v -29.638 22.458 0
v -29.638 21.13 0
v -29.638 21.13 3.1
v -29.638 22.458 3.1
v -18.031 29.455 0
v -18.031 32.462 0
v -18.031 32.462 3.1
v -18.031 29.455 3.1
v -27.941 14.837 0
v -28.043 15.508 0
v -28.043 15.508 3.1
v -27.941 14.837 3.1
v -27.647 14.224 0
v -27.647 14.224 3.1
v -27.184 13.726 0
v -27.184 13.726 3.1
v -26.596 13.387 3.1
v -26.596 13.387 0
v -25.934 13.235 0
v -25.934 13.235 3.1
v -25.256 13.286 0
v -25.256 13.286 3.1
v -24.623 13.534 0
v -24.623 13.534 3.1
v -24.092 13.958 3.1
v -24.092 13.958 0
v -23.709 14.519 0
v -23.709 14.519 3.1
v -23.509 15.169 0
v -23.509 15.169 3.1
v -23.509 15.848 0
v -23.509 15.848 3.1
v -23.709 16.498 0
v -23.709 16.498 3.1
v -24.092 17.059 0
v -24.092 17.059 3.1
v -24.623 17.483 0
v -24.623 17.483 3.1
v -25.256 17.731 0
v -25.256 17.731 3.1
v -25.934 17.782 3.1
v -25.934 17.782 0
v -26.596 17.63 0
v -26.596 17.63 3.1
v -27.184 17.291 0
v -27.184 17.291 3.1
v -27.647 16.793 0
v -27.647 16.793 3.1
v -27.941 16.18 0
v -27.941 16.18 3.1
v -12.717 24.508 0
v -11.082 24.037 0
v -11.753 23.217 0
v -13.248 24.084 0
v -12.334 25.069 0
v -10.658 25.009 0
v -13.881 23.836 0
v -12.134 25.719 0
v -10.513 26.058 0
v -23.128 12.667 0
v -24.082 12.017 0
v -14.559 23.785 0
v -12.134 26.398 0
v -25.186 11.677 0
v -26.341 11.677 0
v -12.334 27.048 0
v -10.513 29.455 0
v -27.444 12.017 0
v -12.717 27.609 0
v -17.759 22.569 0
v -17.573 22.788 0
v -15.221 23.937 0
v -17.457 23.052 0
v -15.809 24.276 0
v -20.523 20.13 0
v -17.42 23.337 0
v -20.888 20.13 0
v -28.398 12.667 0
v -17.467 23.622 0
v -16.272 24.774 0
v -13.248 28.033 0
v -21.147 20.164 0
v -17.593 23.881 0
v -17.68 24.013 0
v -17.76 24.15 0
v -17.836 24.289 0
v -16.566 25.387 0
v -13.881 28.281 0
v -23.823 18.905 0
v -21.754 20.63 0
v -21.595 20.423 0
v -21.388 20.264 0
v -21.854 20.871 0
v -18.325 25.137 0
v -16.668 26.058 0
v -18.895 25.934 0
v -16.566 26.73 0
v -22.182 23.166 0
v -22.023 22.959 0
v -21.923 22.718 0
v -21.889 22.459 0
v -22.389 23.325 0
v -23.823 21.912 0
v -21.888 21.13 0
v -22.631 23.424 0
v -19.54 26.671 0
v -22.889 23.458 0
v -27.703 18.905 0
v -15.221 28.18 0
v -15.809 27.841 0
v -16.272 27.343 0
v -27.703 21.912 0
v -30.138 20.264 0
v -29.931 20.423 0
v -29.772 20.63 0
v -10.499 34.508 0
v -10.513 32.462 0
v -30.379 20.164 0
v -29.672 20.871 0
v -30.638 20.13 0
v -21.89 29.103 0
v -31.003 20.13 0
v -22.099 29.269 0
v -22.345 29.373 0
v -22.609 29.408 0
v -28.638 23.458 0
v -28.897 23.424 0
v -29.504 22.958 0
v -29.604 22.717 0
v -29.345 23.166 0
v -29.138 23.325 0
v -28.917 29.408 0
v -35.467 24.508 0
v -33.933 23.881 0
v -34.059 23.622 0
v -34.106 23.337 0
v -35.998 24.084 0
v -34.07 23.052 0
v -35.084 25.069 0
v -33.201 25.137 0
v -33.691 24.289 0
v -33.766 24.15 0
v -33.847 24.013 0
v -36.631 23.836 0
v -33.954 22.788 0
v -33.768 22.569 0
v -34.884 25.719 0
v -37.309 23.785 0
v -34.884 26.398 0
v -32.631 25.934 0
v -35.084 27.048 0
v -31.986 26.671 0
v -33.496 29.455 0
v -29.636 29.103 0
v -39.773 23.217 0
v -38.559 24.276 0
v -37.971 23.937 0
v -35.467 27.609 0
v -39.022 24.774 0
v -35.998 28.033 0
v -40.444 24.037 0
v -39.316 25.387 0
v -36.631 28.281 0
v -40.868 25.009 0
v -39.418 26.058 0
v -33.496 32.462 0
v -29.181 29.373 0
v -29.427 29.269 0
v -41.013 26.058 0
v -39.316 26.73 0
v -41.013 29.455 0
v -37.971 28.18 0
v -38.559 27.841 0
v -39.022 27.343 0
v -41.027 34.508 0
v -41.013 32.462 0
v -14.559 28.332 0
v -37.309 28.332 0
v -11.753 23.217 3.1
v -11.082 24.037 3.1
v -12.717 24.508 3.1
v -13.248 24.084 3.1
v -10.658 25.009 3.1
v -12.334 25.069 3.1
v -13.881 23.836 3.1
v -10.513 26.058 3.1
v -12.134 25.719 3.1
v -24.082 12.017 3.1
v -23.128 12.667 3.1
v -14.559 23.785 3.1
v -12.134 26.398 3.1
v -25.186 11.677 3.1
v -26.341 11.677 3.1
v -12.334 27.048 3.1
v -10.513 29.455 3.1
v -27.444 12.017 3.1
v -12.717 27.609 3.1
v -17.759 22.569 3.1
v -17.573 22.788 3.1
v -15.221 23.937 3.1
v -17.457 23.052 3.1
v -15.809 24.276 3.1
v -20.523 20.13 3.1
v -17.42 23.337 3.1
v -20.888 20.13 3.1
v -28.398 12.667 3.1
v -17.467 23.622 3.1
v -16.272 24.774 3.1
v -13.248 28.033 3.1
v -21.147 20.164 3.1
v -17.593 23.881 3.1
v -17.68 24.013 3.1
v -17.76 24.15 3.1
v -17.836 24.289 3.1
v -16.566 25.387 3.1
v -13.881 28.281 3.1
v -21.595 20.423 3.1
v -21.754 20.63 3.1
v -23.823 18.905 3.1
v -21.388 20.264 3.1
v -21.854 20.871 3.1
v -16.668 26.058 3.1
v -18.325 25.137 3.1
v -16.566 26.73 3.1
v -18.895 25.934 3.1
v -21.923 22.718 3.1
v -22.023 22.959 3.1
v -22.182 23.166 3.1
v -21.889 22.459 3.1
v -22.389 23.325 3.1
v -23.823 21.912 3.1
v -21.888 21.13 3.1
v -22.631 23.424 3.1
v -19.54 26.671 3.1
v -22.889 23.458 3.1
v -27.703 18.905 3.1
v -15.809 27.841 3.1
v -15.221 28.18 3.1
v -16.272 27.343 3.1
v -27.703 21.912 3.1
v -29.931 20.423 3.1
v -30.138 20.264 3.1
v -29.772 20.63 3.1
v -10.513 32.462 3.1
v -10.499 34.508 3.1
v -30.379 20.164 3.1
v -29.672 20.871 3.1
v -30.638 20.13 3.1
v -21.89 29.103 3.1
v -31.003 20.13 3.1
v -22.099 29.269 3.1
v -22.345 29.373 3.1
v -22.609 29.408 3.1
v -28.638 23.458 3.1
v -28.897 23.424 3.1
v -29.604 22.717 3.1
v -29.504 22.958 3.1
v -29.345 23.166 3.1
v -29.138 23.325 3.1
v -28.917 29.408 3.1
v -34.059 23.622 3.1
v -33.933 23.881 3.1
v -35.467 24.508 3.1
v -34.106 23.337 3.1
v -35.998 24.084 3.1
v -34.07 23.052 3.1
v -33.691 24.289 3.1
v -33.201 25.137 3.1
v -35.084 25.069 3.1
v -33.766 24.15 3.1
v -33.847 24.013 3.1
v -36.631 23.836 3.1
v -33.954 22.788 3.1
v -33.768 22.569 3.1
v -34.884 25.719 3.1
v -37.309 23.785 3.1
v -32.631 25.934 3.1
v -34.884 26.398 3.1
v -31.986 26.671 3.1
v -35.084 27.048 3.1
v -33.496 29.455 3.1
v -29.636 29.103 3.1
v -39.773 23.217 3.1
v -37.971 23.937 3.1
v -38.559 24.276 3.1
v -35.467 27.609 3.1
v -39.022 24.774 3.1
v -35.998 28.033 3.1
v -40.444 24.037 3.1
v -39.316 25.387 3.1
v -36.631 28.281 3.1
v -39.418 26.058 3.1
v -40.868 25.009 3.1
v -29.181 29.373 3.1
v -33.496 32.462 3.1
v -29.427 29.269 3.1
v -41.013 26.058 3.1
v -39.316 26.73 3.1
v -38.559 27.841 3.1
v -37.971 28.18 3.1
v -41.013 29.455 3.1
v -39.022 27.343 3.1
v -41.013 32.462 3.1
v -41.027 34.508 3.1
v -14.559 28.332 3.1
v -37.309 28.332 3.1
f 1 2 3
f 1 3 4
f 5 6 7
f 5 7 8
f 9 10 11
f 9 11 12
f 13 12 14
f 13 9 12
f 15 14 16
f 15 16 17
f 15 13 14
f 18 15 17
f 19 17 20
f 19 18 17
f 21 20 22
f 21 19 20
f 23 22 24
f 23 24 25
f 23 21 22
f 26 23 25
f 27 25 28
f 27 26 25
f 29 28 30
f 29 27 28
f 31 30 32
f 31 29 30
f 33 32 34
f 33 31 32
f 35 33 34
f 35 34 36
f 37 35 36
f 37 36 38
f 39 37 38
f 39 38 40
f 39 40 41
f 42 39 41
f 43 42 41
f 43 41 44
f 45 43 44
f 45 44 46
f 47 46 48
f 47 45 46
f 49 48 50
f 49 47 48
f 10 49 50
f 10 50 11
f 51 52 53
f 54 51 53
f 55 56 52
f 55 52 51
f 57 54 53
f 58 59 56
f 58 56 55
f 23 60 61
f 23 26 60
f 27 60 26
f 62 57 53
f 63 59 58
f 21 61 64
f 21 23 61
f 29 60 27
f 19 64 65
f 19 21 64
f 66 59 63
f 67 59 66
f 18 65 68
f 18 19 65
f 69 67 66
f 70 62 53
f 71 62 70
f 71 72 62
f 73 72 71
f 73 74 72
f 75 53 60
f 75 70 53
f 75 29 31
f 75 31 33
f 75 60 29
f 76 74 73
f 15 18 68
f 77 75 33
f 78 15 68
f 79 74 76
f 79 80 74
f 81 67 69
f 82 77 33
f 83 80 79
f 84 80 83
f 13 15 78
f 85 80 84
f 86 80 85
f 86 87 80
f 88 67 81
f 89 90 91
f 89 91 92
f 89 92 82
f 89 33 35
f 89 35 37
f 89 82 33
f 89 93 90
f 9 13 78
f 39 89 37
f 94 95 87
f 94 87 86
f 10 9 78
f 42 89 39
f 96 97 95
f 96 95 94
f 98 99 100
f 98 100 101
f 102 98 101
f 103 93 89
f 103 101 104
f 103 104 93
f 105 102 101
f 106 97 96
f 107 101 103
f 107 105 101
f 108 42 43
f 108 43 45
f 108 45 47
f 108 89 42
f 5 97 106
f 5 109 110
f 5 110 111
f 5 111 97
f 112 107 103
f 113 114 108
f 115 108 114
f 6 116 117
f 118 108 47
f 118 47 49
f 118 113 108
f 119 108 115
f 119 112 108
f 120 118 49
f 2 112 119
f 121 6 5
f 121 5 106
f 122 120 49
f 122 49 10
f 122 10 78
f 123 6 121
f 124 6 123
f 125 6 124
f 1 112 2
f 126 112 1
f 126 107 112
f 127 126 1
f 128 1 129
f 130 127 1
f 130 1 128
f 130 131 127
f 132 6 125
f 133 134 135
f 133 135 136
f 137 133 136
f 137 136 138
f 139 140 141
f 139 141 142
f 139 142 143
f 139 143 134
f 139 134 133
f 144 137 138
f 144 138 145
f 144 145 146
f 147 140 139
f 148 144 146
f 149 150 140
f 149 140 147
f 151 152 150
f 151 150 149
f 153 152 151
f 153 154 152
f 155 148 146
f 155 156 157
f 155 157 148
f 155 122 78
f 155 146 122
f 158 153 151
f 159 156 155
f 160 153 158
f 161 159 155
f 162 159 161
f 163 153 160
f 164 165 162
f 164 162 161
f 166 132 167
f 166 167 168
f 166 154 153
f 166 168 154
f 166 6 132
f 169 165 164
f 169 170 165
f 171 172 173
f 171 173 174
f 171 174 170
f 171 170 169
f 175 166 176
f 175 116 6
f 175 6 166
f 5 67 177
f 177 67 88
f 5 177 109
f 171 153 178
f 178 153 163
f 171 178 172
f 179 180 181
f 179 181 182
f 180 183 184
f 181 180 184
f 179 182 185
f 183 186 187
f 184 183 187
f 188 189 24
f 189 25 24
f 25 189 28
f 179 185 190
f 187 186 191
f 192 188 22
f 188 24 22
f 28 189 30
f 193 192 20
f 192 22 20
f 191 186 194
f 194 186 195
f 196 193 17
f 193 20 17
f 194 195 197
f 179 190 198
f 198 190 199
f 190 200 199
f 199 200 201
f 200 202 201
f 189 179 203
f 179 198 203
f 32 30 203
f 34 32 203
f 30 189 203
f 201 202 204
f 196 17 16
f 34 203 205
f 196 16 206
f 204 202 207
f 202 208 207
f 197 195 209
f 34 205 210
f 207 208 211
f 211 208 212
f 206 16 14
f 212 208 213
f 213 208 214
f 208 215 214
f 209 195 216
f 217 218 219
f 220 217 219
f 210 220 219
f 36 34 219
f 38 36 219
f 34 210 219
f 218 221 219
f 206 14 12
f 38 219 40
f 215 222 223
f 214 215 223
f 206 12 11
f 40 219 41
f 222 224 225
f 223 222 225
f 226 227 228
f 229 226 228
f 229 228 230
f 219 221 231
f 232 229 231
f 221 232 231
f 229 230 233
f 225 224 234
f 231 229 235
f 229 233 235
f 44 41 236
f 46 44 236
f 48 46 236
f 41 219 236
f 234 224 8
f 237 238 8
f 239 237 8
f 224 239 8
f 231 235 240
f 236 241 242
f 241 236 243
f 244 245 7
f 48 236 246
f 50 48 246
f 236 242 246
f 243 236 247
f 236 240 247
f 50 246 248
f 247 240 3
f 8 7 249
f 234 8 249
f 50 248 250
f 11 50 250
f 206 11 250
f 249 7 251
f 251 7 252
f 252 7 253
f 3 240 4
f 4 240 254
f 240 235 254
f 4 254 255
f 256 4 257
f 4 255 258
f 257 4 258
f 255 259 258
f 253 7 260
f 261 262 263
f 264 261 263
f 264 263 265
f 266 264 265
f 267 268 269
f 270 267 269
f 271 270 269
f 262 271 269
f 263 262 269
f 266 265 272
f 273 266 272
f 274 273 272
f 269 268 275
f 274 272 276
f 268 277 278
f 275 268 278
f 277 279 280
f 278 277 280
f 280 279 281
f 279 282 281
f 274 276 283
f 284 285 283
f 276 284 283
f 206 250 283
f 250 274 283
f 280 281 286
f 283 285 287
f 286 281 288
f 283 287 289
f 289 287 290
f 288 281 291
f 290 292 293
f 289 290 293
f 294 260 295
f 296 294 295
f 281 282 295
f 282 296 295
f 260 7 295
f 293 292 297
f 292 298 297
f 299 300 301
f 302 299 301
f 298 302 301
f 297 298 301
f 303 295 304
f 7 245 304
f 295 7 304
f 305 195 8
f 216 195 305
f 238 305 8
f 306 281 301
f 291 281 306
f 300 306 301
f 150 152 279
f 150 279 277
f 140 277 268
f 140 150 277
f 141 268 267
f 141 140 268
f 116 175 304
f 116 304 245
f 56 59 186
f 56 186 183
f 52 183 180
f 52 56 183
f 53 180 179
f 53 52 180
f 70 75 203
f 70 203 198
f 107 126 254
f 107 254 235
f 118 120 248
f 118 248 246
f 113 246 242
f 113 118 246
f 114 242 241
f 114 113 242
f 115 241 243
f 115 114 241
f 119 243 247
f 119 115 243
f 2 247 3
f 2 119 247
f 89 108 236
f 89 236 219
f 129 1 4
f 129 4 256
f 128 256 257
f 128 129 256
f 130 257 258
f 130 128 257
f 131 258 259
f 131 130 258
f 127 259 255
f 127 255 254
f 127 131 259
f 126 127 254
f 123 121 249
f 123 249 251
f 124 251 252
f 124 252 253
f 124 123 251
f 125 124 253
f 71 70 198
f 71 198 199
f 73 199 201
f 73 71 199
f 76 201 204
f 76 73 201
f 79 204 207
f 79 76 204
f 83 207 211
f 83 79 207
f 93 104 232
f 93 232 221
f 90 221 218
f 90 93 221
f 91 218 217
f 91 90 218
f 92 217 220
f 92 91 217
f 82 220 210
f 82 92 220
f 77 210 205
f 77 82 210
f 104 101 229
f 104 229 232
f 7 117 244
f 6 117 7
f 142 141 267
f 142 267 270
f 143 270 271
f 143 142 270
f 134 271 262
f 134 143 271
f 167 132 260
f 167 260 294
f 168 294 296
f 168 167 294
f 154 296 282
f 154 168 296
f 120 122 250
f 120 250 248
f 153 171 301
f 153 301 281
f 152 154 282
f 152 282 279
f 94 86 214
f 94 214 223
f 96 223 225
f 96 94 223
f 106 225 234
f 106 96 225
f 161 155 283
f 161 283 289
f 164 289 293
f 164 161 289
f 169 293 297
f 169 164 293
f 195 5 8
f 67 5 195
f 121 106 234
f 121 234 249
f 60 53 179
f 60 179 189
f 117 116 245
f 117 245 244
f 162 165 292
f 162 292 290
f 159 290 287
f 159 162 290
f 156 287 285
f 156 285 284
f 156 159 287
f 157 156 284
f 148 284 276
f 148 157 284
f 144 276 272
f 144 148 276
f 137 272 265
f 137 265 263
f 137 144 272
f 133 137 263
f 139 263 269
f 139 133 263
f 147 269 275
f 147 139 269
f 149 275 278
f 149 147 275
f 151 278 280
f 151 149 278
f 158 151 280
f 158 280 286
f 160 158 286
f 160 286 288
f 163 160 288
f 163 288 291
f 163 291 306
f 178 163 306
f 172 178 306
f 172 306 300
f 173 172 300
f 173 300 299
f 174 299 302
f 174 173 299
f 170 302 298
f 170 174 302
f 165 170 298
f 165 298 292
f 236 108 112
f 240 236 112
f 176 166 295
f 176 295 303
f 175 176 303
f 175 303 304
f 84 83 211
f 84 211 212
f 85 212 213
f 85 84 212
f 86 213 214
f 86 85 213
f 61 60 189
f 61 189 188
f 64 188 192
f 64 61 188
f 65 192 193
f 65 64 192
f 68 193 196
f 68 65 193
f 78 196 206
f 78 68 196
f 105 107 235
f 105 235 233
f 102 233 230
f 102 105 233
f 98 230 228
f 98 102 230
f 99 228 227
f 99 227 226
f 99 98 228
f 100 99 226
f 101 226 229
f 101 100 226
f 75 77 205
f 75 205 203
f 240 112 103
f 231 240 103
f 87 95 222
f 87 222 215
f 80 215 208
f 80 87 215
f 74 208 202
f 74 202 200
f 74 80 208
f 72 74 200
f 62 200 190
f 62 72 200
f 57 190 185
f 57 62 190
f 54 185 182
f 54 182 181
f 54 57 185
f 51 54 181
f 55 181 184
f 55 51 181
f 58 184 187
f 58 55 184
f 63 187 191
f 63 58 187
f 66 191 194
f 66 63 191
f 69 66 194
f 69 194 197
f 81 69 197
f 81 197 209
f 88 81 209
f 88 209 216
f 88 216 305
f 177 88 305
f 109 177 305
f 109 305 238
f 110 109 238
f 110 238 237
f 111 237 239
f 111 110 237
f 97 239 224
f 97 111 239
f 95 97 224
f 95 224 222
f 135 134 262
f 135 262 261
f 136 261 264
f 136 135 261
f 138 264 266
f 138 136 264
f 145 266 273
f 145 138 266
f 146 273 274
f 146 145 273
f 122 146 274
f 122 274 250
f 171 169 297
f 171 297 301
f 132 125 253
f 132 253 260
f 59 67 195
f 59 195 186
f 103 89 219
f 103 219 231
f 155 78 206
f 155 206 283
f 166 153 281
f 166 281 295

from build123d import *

# Parameters (mm, degrees)
SKETCH1_R      = 2.2795
SKETCH1_W      = 3.88
SKETCH1_H      = 3.007
EXTRUDE1_DEPTH = 3.1


with BuildPart() as part:
    # Sketch1 → Extrude1 (new body)
    with BuildSketch(Plane.XY):
        with BuildLine():
            Line((-41.027382287, 34.508489293), (-10.498924525, 34.508489293))
            Line((-10.498924525, 34.508489293), (-10.513157114, 32.461989293))
            Line((-10.513157114, 32.461989293), (-18.030657114, 32.461989293))
            Line((-18.030657114, 32.461989293), (-18.030657114, 29.454989293))
            Line((-18.030657114, 29.454989293), (-10.513157114, 29.454989293))
            Line((-10.513157114, 29.454989293), (-10.513157114, 26.058489293))
            ThreePointArc((-10.513157114, 26.058489293), (-10.83664158, 24.508533678), (-11.7530861, 23.217358224))
            Line((-11.7530861, 23.217358224), (-23.1280861, 12.667358224))
            ThreePointArc((-23.1280861, 12.667358224), (-25.763157114, 11.633489293), (-28.398228128, 12.667358224))
            Line((-28.398228128, 12.667358224), (-39.773228128, 23.217358224))
            ThreePointArc((-39.773228128, 23.217358224), (-40.689672648, 24.508533678), (-41.013157114, 26.058489293))
            Line((-41.013157114, 26.058489293), (-41.013157114, 29.454989293))
            Line((-41.013157114, 29.454989293), (-33.495657114, 29.454989293))
            Line((-33.495657114, 29.454989293), (-33.495657114, 32.461989293))
            Line((-33.495657114, 32.461989293), (-41.013157114, 32.461989293))
            Line((-41.013157114, 32.461989293), (-41.027382287, 34.508489293))
        make_face()
        with Locations(Location((-14.388157114, 26.058489293, 0), (0, 0, 180))):
            Circle(SKETCH1_R, mode=Mode.SUBTRACT)
        with Locations(Location((-37.138157114, 26.058489293, 0), (0, 0, 180))):
            Circle(SKETCH1_R, mode=Mode.SUBTRACT)
        with Locations(Location((-25.763157114, 15.508489293, 0), (0, 0, 180))):
            Circle(SKETCH1_R, mode=Mode.SUBTRACT)
        with BuildLine():
            Line((-33.76750302, 22.568552775), (-31.002944054, 20.130132194))
            Line((-31.002944054, 20.130132194), (-30.638157114, 20.130132194))
            ThreePointArc((-30.638157114, 20.130132194), (-29.931050333, 20.423025412), (-29.638157114, 21.130132194))
            Line((-29.638157114, 21.130132194), (-29.638157114, 22.458489293))
            ThreePointArc((-29.638157114, 22.458489293), (-29.345263895, 23.165596075), (-28.638157114, 23.458489293))
            Line((-28.638157114, 23.458489293), (-22.889213944, 23.458489293))
            ThreePointArc((-22.889213944, 23.458489293), (-22.182388419, 23.165877219), (-21.889214261, 22.459284647))
            Line((-21.889214261, 22.459284647), (-21.888157114, 21.130132194))
            ThreePointArc((-21.888157114, 21.130132194), (-21.595263895, 20.423025412), (-20.888157114, 20.130132194))
            Line((-20.888157114, 20.130132194), (-20.523370174, 20.130132194))
            Line((-20.523370174, 20.130132194), (-17.758811208, 22.568552775))
            ThreePointArc((-17.758811208, 22.568552775), (-17.428169762, 23.19327051), (-17.593190704, 23.880558008))
            ThreePointArc((-17.593190704, 23.880558008), (-17.720651816, 24.081090988), (-17.835582513, 24.289059126))
            ThreePointArc((-17.835582513, 24.289059126), (-18.600140603, 25.542598068), (-19.540017718, 26.670667198))
            Line((-19.540017718, 26.670667198), (-21.890008982, 29.103277241))
            ThreePointArc((-21.890008982, 29.103277241), (-22.218575416, 29.329029338), (-22.609223629, 29.408489293))
            Line((-22.609223629, 29.408489293), (-28.917090599, 29.408489293))
            ThreePointArc((-28.917090599, 29.408489293), (-29.307738812, 29.329029338), (-29.636305246, 29.103277241))
            Line((-29.636305246, 29.103277241), (-31.98629651, 26.670667198))
            ThreePointArc((-31.98629651, 26.670667198), (-32.926173625, 25.542598068), (-33.690731715, 24.289059126))
            ThreePointArc((-33.690731715, 24.289059126), (-33.805662411, 24.081090988), (-33.933123524, 23.880558008))
            ThreePointArc((-33.933123524, 23.880558008), (-34.098144466, 23.19327051), (-33.76750302, 22.568552775))
        make_face(mode=Mode.SUBTRACT)
        with Locations((-25.763157114, 20.408489293)):
            Rectangle(SKETCH1_W, SKETCH1_H, mode=Mode.SUBTRACT)
    extrude(amount=EXTRUDE1_DEPTH)


solid = part.part
